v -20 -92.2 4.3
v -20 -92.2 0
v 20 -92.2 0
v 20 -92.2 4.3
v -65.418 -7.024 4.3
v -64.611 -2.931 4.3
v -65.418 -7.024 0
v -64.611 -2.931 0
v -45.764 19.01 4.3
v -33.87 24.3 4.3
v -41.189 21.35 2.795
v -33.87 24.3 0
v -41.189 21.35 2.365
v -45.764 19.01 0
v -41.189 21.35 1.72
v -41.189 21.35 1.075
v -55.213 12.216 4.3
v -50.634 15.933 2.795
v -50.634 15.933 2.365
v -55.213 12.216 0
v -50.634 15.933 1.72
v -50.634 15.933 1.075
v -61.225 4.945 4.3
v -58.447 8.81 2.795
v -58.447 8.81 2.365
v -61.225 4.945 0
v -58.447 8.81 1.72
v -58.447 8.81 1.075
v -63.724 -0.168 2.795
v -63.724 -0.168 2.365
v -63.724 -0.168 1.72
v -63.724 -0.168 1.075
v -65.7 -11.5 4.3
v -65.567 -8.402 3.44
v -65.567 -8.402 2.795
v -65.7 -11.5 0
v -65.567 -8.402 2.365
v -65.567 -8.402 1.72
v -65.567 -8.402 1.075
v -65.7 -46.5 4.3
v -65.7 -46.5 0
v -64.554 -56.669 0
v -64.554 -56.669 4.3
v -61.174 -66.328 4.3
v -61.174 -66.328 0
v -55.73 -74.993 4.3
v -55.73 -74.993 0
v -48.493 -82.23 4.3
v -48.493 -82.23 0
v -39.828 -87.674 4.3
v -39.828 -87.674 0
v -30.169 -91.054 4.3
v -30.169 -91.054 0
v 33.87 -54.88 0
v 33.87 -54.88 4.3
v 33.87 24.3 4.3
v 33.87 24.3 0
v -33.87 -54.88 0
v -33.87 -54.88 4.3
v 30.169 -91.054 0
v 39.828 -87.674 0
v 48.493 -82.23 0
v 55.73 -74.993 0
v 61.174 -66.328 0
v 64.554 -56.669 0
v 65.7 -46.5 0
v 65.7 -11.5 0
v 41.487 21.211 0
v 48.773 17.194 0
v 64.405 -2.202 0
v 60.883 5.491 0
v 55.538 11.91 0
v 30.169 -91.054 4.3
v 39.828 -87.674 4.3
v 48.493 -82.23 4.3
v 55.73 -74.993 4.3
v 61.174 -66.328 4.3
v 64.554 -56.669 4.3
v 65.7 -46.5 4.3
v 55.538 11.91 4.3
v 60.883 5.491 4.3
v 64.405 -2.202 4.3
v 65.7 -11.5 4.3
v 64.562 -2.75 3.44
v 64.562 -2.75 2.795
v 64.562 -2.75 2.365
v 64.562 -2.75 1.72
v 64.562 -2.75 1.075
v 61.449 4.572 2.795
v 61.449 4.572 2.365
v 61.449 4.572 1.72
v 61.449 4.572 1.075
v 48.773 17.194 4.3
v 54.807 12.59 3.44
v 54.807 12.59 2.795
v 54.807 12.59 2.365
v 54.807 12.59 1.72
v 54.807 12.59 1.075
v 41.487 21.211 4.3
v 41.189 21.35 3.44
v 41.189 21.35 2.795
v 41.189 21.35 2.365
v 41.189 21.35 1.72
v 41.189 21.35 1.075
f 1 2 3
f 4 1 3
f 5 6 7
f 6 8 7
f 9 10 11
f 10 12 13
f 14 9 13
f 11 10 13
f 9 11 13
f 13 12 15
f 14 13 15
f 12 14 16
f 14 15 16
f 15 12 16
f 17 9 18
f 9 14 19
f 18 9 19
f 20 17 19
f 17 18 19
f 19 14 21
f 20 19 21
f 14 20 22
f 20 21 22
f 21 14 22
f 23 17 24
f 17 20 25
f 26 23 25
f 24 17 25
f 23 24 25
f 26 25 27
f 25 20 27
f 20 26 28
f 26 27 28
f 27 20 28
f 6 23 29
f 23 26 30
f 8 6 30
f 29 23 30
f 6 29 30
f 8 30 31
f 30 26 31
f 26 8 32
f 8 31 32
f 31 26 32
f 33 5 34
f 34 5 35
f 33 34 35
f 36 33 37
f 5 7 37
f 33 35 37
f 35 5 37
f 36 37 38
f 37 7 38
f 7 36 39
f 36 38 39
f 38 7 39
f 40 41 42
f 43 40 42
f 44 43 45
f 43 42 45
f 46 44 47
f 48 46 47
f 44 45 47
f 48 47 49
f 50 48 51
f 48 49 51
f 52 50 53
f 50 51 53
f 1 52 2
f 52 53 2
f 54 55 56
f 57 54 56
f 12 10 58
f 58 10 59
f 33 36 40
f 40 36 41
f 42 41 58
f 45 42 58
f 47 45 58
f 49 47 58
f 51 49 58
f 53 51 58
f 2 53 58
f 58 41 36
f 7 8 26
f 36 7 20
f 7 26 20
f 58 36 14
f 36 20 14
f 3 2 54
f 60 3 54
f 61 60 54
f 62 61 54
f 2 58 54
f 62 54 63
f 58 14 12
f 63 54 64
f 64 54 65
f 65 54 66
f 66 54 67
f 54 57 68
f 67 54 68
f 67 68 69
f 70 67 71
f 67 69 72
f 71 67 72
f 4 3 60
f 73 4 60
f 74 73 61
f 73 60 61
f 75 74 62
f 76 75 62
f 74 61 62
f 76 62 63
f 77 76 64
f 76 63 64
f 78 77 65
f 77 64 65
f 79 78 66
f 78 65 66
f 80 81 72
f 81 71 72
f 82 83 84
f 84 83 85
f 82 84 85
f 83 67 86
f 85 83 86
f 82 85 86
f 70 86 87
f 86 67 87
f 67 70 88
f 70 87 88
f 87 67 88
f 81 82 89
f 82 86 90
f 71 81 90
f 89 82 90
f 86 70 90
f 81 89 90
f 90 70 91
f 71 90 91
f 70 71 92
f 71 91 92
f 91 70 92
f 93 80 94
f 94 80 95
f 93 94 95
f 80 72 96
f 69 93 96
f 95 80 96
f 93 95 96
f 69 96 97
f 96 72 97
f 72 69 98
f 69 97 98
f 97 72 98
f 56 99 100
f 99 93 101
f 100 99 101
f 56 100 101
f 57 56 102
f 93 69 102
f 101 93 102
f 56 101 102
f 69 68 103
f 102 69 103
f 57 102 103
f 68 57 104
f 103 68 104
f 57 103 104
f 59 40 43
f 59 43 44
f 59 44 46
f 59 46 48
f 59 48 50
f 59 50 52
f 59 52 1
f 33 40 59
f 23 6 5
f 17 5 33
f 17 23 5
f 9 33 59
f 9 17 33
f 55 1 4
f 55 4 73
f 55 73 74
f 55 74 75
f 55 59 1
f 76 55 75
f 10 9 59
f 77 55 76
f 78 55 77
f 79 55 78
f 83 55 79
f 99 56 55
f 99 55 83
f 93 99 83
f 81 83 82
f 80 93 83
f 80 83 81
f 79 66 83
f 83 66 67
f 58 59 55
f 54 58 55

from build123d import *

# Parameters (mm, degrees)
BOSS_EXTRUDE1_DEPTH = 4.3
CUT_EXTRUDE1_DEPTH  = 10


with BuildPart() as part:
    # Sketch1 → Boss-Extrude1 (new body)
    with BuildSketch(Plane.XY):
        with BuildLine():
            Line((-20, -92.2), (-14.429475301, -92.2))
            Line((-14.429475301, -92.2), (20, -92.2))
            ThreePointArc((20, -92.2), (52.3147799, -78.8147799), (65.7, -46.5))
            Line((65.7, -46.5), (65.7, -11.5))
            add(Edge.make_bspline(
                [(65.7, -11.5), (65.7, -10.975589958), (65.677234408, -9.915490978), (65.544187041, -7.888412939), (65.220242618, -5.460671952), (64.598062769, -2.723715825), (63.478515533, 0.7162036), (61.569949009, 4.65452752), (58.553422876, 8.885275051), (54.896250473, 12.662614765), (49.30515895, 17.117750268), (41.279444306, 21.616942397), (32.802615045, 24.780729734), (26.33891585, 26.60624502), (21.797211531, 27.651780938), (17.71021827, 28.4039364), (14.808687361, 28.812738163), (12.872312778, 29.025349646), (11.633648581, 29.131856353), (10.811523275, 29.180203188), (10.282988146, 29.197593371), (10.101212389, 29.2), (10, 29.2)],
                knots=[0, 0, 0, 0, 0.015625, 0.03125, 0.0625, 0.09375, 0.125, 0.1875, 0.25, 0.3125, 0.375, 0.5, 0.625, 0.6875, 0.75, 0.8125, 0.875, 0.90625, 0.9375, 0.96875, 0.984375, 1, 1, 1, 1], degree=3))
            Line((10, 29.2), (-10, 29.2))
            add(Edge.make_bspline(
                [(-10, 29.2), (-10.101212389, 29.2), (-10.282988146, 29.197593371), (-10.811523275, 29.180203188), (-11.633648581, 29.131856353), (-12.872312778, 29.025349646), (-14.808687361, 28.812738163), (-17.71021827, 28.4039364), (-21.797211531, 27.651780938), (-26.33891585, 26.60624502), (-32.802615045, 24.780729734), (-41.279444306, 21.616942397), (-49.30515895, 17.117750268), (-54.896250473, 12.662614765), (-58.553422876, 8.885275051), (-61.569949009, 4.65452752), (-63.478515533, 0.7162036), (-64.598062769, -2.723715825), (-65.220242618, -5.460671952), (-65.544187041, -7.888412939), (-65.677234408, -9.915490978), (-65.7, -10.975589958), (-65.7, -11.5)],
                knots=[0, 0, 0, 0, 0.015625, 0.03125, 0.0625, 0.09375, 0.125, 0.1875, 0.25, 0.3125, 0.375, 0.5, 0.625, 0.6875, 0.75, 0.8125, 0.875, 0.90625, 0.9375, 0.96875, 0.984375, 1, 1, 1, 1], degree=3))
            Line((-65.7, -11.5), (-65.7, -46.5))
            ThreePointArc((-65.7, -46.5), (-52.3147799, -78.8147799), (-20, -92.2))
        make_face()
    extrude(amount=BOSS_EXTRUDE1_DEPTH)

    # Sketch2 → Cut-Extrude1 (cut)
    with BuildSketch(Plane.XY.offset(4.3)):
        Polygon((-33.87, 24.299748656), (-33.87, -54.880251344), (33.87, -54.880251344), (33.87, 24.299748656), (33.87, 35.468874446), (-33.87, 35.468874446), align=None)
    extrude(amount=-CUT_EXTRUDE1_DEPTH, mode=Mode.SUBTRACT)


solid = part.part
